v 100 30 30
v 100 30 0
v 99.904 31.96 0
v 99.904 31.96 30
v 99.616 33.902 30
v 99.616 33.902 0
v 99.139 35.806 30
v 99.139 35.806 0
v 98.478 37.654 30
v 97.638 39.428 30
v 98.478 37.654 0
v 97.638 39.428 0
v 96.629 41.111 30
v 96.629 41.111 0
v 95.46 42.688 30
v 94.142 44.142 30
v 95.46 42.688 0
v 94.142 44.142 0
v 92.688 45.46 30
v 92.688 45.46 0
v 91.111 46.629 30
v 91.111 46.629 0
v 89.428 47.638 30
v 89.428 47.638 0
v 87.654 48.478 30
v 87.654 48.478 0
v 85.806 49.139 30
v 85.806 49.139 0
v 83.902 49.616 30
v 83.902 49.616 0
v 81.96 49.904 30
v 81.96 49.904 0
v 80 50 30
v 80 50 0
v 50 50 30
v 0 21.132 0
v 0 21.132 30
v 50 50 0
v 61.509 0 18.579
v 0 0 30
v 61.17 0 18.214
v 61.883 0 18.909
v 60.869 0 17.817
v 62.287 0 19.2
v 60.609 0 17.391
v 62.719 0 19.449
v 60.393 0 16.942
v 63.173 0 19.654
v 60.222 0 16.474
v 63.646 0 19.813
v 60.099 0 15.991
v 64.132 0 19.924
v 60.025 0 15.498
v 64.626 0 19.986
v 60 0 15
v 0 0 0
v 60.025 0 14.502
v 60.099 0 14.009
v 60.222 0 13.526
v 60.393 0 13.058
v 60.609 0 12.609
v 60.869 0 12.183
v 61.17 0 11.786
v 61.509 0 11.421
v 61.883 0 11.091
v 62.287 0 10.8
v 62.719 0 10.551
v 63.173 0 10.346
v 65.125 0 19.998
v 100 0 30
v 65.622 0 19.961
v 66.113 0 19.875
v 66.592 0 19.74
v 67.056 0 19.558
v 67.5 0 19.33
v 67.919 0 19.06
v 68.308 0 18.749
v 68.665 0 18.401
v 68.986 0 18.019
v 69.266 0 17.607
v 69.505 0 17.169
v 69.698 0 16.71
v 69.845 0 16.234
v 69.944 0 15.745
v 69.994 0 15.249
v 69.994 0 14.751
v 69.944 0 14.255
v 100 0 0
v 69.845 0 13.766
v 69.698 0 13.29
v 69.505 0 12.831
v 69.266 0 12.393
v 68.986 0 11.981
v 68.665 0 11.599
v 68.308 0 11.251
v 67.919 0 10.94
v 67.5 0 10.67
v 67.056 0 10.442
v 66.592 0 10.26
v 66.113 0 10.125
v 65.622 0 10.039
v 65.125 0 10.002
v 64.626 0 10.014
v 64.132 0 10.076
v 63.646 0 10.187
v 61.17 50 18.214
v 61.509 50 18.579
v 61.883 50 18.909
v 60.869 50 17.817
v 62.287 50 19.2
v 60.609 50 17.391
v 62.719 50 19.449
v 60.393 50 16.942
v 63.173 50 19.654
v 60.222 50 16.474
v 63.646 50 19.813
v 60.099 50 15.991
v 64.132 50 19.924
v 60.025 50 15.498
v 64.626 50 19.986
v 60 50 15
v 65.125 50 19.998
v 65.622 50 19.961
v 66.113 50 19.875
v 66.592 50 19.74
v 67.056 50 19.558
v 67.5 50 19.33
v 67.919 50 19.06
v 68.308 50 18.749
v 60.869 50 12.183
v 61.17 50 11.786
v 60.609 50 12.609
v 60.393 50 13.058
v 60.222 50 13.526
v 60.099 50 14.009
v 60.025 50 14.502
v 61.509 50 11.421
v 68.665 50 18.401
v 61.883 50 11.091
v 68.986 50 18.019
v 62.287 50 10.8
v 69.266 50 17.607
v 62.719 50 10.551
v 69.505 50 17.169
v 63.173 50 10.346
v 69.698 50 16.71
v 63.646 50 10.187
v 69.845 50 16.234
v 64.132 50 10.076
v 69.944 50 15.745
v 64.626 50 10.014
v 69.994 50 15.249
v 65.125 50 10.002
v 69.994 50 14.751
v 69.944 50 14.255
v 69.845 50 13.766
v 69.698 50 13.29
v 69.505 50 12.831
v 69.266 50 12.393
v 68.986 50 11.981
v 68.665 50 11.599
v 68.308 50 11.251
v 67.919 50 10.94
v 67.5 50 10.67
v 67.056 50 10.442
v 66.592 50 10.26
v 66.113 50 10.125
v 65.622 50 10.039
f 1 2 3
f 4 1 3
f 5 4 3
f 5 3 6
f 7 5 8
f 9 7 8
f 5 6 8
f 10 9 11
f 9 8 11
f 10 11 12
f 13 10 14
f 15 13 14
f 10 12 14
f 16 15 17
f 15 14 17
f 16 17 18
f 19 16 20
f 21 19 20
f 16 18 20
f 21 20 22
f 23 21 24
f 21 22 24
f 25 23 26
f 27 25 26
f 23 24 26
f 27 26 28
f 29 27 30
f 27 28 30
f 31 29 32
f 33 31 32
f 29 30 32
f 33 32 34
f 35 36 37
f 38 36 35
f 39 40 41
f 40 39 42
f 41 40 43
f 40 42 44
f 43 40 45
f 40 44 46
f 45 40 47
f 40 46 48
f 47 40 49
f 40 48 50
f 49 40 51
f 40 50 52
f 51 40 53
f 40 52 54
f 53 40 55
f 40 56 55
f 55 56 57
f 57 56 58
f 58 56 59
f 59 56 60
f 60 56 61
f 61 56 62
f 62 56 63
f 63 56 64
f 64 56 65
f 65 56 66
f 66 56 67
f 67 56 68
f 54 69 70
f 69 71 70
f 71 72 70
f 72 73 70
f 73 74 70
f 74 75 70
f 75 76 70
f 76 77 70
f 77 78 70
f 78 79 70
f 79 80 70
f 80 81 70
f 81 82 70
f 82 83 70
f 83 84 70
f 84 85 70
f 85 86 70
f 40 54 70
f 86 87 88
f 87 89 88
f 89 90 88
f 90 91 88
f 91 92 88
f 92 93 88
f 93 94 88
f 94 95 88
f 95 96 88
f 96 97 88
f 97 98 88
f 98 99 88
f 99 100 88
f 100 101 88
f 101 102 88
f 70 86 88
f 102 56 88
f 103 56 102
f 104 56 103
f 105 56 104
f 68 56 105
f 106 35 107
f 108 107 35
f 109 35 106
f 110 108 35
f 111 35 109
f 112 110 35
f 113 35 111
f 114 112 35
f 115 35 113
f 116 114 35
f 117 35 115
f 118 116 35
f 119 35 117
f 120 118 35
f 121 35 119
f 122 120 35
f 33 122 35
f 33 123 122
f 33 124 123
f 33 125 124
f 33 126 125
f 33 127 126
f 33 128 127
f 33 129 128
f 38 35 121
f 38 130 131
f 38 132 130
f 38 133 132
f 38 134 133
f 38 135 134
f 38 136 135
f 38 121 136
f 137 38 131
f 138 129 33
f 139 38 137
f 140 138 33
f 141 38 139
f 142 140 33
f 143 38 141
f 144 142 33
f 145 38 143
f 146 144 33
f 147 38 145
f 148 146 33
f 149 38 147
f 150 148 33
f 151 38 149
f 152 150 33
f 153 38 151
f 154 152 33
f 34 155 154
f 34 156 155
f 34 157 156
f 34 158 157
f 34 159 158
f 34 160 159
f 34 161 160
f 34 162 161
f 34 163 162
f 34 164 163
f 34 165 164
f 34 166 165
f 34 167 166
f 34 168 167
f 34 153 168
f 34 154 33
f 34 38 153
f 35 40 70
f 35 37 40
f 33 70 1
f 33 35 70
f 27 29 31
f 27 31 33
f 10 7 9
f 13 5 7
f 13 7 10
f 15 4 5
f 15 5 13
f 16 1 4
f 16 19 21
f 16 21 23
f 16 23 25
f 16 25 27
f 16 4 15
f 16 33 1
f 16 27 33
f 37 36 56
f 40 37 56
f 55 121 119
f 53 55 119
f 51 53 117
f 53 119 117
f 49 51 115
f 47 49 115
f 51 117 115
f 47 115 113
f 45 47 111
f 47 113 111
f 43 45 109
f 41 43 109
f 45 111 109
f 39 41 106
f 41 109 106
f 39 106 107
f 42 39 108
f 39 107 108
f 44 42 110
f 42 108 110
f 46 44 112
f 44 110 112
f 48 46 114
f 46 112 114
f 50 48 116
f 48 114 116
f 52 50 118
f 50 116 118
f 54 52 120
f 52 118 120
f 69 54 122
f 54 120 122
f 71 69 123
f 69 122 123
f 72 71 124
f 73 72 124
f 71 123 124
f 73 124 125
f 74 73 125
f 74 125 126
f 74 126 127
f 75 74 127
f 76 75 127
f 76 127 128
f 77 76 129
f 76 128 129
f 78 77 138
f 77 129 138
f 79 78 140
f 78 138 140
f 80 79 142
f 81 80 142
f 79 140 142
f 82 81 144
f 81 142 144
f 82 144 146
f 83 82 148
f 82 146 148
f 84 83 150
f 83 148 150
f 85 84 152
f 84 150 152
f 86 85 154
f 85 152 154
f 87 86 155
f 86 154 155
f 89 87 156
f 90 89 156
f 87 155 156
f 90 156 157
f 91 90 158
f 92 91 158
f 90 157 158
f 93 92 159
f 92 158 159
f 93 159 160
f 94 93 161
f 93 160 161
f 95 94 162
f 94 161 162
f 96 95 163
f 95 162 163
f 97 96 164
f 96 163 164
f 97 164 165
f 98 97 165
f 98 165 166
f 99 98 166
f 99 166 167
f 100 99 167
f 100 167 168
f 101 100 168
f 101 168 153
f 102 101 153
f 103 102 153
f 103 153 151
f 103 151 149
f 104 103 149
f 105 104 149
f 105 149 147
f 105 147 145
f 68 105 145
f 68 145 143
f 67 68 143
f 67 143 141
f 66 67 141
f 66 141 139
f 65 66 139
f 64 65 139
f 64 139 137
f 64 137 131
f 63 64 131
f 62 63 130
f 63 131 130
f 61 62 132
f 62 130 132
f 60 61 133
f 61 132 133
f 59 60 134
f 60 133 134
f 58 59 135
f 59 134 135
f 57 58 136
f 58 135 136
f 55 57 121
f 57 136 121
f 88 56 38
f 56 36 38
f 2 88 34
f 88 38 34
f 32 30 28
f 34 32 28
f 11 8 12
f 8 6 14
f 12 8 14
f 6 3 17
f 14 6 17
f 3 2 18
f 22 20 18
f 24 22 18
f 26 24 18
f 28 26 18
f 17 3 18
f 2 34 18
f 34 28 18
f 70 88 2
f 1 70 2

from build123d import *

# Parameters (mm, degrees)
PAD_DEPTH    = 30
SKETCH001_R  = 5
POCKET_DEPTH = 50


with BuildPart() as part:
    # Sketch → Pad (new body)
    with BuildSketch(Plane.XY):
        with BuildLine():
            Line((0, 0), (100, 0))
            Line((100, 0), (100, 30))
            ThreePointArc((100, 30), (94.142136, 44.142136), (80, 50))
            Line((50, 50), (80, 50))
            Line((0, 21.132487), (50, 50))
            Line((0, 21.132487), (0, 0))
        make_face()
    extrude(amount=PAD_DEPTH)

    # Sketch001 (on Face4 of Pad) → Pocket (cut)
    with BuildSketch(Plane(origin=(0, 50, 0), x_dir=(-1, 0, 0), z_dir=(0, 1, 0))):
        with Locations((-65, 15)):
            Circle(SKETCH001_R)
    extrude(amount=-POCKET_DEPTH, mode=Mode.SUBTRACT)


solid = part.part
